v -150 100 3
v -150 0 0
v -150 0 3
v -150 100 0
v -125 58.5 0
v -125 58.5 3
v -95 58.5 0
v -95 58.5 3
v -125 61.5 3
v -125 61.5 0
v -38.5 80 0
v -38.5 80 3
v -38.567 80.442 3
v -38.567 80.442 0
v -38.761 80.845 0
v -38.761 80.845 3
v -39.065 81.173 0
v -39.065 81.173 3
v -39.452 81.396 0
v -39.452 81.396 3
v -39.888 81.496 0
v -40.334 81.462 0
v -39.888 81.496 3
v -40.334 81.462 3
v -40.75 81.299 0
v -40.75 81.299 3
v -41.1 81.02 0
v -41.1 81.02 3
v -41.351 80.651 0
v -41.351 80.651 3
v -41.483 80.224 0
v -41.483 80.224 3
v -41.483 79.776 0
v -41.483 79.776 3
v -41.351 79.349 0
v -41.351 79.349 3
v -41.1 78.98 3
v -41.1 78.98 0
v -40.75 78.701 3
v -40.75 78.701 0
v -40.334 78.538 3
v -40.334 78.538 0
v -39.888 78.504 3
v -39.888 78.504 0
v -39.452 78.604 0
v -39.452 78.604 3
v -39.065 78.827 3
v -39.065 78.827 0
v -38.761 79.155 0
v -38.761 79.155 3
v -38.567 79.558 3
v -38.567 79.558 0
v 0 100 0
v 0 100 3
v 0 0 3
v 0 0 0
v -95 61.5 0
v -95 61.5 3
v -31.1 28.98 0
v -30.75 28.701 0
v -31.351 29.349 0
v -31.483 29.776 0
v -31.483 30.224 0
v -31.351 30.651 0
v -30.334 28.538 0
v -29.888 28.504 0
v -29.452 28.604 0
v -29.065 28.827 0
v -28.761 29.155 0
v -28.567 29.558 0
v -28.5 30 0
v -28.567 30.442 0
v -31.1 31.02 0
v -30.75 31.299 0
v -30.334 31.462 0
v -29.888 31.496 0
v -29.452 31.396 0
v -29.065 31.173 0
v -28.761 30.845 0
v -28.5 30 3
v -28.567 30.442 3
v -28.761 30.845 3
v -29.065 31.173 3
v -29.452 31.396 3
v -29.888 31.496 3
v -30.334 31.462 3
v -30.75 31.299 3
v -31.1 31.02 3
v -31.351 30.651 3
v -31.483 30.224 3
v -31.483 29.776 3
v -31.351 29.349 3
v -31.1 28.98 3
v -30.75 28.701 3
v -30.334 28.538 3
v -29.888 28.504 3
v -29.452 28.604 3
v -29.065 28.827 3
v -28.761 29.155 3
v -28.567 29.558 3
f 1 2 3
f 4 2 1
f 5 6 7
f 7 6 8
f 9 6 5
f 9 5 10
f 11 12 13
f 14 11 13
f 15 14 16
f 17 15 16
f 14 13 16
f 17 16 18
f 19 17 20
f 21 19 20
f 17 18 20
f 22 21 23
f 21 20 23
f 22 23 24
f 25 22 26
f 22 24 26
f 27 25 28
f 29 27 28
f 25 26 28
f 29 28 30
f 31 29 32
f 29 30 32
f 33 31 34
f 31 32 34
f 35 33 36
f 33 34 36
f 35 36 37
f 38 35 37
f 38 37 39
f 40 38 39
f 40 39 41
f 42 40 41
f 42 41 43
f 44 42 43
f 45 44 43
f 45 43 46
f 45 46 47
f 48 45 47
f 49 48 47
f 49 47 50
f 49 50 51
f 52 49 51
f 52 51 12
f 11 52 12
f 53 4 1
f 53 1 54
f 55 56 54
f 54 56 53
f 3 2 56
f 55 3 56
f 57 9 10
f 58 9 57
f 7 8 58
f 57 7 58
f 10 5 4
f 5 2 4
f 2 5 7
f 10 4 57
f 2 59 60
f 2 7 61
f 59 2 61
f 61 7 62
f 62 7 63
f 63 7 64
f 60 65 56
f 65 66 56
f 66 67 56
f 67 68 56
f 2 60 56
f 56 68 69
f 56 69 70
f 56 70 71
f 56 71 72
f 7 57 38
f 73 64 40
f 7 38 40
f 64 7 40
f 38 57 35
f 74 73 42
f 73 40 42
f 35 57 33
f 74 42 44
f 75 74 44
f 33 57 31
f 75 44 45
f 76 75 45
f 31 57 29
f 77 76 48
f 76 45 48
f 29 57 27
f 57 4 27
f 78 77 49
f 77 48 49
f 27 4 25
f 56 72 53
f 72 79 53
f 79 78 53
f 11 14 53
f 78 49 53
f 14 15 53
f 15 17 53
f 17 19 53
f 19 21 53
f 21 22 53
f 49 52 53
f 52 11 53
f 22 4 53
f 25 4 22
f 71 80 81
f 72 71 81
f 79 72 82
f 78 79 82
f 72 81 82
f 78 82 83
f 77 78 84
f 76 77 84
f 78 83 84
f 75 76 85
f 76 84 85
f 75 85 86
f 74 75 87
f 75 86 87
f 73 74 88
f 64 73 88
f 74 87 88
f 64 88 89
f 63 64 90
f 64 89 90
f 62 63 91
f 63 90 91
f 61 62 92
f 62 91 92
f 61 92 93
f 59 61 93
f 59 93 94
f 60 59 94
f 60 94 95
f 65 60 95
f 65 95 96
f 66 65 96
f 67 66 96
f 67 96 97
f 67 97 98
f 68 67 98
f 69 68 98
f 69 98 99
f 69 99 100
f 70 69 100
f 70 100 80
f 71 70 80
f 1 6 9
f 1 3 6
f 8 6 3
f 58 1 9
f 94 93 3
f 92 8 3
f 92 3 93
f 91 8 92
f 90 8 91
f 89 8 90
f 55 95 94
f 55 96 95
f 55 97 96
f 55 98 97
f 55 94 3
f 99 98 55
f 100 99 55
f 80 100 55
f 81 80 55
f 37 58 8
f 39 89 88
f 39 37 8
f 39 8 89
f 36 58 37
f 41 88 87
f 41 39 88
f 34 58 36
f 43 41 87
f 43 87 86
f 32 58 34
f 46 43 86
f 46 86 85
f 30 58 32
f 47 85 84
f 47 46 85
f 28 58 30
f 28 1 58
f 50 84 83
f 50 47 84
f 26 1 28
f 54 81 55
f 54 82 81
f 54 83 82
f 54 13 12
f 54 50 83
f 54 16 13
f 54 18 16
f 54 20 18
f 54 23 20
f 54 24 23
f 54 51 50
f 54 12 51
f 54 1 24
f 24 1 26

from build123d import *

# Parameters (mm, degrees)
SKETCH_1_W          = 150
SKETCH_1_H          = 100
EXTRUDE_2_DEPTH     = 3
SKETCH_2_R          = 1.5
CUT_EXTRUDE_1_DEPTH = 181.302523554
SKETCH_3_W          = 30
SKETCH_3_H          = 3
CUT_EXTRUDE_2_DEPTH = 181.302523554


with BuildPart() as part:
    # 草图1 → 凸台-拉伸2 (new body)
    with BuildSketch(Plane.XY):
        with Locations((-75, 50)):
            Rectangle(SKETCH_1_W, SKETCH_1_H)
    extrude(amount=EXTRUDE_2_DEPTH)

    # 草图2 → 切除-拉伸1 (cut, through all)
    with BuildSketch(Plane.XY.offset(3)):
        with Locations((-30, 30)):
            Circle(SKETCH_2_R)
        with Locations((-40, 80)):
            Circle(SKETCH_2_R)
    extrude(amount=-CUT_EXTRUDE_1_DEPTH, mode=Mode.SUBTRACT)

    # 草图3 → 切除-拉伸2 (cut, through all)
    with BuildSketch(Plane.XY.offset(3)):
        with Locations((-110, 60)):
            Rectangle(SKETCH_3_W, SKETCH_3_H)
    extrude(amount=-CUT_EXTRUDE_2_DEPTH, mode=Mode.SUBTRACT)


solid = part.part
